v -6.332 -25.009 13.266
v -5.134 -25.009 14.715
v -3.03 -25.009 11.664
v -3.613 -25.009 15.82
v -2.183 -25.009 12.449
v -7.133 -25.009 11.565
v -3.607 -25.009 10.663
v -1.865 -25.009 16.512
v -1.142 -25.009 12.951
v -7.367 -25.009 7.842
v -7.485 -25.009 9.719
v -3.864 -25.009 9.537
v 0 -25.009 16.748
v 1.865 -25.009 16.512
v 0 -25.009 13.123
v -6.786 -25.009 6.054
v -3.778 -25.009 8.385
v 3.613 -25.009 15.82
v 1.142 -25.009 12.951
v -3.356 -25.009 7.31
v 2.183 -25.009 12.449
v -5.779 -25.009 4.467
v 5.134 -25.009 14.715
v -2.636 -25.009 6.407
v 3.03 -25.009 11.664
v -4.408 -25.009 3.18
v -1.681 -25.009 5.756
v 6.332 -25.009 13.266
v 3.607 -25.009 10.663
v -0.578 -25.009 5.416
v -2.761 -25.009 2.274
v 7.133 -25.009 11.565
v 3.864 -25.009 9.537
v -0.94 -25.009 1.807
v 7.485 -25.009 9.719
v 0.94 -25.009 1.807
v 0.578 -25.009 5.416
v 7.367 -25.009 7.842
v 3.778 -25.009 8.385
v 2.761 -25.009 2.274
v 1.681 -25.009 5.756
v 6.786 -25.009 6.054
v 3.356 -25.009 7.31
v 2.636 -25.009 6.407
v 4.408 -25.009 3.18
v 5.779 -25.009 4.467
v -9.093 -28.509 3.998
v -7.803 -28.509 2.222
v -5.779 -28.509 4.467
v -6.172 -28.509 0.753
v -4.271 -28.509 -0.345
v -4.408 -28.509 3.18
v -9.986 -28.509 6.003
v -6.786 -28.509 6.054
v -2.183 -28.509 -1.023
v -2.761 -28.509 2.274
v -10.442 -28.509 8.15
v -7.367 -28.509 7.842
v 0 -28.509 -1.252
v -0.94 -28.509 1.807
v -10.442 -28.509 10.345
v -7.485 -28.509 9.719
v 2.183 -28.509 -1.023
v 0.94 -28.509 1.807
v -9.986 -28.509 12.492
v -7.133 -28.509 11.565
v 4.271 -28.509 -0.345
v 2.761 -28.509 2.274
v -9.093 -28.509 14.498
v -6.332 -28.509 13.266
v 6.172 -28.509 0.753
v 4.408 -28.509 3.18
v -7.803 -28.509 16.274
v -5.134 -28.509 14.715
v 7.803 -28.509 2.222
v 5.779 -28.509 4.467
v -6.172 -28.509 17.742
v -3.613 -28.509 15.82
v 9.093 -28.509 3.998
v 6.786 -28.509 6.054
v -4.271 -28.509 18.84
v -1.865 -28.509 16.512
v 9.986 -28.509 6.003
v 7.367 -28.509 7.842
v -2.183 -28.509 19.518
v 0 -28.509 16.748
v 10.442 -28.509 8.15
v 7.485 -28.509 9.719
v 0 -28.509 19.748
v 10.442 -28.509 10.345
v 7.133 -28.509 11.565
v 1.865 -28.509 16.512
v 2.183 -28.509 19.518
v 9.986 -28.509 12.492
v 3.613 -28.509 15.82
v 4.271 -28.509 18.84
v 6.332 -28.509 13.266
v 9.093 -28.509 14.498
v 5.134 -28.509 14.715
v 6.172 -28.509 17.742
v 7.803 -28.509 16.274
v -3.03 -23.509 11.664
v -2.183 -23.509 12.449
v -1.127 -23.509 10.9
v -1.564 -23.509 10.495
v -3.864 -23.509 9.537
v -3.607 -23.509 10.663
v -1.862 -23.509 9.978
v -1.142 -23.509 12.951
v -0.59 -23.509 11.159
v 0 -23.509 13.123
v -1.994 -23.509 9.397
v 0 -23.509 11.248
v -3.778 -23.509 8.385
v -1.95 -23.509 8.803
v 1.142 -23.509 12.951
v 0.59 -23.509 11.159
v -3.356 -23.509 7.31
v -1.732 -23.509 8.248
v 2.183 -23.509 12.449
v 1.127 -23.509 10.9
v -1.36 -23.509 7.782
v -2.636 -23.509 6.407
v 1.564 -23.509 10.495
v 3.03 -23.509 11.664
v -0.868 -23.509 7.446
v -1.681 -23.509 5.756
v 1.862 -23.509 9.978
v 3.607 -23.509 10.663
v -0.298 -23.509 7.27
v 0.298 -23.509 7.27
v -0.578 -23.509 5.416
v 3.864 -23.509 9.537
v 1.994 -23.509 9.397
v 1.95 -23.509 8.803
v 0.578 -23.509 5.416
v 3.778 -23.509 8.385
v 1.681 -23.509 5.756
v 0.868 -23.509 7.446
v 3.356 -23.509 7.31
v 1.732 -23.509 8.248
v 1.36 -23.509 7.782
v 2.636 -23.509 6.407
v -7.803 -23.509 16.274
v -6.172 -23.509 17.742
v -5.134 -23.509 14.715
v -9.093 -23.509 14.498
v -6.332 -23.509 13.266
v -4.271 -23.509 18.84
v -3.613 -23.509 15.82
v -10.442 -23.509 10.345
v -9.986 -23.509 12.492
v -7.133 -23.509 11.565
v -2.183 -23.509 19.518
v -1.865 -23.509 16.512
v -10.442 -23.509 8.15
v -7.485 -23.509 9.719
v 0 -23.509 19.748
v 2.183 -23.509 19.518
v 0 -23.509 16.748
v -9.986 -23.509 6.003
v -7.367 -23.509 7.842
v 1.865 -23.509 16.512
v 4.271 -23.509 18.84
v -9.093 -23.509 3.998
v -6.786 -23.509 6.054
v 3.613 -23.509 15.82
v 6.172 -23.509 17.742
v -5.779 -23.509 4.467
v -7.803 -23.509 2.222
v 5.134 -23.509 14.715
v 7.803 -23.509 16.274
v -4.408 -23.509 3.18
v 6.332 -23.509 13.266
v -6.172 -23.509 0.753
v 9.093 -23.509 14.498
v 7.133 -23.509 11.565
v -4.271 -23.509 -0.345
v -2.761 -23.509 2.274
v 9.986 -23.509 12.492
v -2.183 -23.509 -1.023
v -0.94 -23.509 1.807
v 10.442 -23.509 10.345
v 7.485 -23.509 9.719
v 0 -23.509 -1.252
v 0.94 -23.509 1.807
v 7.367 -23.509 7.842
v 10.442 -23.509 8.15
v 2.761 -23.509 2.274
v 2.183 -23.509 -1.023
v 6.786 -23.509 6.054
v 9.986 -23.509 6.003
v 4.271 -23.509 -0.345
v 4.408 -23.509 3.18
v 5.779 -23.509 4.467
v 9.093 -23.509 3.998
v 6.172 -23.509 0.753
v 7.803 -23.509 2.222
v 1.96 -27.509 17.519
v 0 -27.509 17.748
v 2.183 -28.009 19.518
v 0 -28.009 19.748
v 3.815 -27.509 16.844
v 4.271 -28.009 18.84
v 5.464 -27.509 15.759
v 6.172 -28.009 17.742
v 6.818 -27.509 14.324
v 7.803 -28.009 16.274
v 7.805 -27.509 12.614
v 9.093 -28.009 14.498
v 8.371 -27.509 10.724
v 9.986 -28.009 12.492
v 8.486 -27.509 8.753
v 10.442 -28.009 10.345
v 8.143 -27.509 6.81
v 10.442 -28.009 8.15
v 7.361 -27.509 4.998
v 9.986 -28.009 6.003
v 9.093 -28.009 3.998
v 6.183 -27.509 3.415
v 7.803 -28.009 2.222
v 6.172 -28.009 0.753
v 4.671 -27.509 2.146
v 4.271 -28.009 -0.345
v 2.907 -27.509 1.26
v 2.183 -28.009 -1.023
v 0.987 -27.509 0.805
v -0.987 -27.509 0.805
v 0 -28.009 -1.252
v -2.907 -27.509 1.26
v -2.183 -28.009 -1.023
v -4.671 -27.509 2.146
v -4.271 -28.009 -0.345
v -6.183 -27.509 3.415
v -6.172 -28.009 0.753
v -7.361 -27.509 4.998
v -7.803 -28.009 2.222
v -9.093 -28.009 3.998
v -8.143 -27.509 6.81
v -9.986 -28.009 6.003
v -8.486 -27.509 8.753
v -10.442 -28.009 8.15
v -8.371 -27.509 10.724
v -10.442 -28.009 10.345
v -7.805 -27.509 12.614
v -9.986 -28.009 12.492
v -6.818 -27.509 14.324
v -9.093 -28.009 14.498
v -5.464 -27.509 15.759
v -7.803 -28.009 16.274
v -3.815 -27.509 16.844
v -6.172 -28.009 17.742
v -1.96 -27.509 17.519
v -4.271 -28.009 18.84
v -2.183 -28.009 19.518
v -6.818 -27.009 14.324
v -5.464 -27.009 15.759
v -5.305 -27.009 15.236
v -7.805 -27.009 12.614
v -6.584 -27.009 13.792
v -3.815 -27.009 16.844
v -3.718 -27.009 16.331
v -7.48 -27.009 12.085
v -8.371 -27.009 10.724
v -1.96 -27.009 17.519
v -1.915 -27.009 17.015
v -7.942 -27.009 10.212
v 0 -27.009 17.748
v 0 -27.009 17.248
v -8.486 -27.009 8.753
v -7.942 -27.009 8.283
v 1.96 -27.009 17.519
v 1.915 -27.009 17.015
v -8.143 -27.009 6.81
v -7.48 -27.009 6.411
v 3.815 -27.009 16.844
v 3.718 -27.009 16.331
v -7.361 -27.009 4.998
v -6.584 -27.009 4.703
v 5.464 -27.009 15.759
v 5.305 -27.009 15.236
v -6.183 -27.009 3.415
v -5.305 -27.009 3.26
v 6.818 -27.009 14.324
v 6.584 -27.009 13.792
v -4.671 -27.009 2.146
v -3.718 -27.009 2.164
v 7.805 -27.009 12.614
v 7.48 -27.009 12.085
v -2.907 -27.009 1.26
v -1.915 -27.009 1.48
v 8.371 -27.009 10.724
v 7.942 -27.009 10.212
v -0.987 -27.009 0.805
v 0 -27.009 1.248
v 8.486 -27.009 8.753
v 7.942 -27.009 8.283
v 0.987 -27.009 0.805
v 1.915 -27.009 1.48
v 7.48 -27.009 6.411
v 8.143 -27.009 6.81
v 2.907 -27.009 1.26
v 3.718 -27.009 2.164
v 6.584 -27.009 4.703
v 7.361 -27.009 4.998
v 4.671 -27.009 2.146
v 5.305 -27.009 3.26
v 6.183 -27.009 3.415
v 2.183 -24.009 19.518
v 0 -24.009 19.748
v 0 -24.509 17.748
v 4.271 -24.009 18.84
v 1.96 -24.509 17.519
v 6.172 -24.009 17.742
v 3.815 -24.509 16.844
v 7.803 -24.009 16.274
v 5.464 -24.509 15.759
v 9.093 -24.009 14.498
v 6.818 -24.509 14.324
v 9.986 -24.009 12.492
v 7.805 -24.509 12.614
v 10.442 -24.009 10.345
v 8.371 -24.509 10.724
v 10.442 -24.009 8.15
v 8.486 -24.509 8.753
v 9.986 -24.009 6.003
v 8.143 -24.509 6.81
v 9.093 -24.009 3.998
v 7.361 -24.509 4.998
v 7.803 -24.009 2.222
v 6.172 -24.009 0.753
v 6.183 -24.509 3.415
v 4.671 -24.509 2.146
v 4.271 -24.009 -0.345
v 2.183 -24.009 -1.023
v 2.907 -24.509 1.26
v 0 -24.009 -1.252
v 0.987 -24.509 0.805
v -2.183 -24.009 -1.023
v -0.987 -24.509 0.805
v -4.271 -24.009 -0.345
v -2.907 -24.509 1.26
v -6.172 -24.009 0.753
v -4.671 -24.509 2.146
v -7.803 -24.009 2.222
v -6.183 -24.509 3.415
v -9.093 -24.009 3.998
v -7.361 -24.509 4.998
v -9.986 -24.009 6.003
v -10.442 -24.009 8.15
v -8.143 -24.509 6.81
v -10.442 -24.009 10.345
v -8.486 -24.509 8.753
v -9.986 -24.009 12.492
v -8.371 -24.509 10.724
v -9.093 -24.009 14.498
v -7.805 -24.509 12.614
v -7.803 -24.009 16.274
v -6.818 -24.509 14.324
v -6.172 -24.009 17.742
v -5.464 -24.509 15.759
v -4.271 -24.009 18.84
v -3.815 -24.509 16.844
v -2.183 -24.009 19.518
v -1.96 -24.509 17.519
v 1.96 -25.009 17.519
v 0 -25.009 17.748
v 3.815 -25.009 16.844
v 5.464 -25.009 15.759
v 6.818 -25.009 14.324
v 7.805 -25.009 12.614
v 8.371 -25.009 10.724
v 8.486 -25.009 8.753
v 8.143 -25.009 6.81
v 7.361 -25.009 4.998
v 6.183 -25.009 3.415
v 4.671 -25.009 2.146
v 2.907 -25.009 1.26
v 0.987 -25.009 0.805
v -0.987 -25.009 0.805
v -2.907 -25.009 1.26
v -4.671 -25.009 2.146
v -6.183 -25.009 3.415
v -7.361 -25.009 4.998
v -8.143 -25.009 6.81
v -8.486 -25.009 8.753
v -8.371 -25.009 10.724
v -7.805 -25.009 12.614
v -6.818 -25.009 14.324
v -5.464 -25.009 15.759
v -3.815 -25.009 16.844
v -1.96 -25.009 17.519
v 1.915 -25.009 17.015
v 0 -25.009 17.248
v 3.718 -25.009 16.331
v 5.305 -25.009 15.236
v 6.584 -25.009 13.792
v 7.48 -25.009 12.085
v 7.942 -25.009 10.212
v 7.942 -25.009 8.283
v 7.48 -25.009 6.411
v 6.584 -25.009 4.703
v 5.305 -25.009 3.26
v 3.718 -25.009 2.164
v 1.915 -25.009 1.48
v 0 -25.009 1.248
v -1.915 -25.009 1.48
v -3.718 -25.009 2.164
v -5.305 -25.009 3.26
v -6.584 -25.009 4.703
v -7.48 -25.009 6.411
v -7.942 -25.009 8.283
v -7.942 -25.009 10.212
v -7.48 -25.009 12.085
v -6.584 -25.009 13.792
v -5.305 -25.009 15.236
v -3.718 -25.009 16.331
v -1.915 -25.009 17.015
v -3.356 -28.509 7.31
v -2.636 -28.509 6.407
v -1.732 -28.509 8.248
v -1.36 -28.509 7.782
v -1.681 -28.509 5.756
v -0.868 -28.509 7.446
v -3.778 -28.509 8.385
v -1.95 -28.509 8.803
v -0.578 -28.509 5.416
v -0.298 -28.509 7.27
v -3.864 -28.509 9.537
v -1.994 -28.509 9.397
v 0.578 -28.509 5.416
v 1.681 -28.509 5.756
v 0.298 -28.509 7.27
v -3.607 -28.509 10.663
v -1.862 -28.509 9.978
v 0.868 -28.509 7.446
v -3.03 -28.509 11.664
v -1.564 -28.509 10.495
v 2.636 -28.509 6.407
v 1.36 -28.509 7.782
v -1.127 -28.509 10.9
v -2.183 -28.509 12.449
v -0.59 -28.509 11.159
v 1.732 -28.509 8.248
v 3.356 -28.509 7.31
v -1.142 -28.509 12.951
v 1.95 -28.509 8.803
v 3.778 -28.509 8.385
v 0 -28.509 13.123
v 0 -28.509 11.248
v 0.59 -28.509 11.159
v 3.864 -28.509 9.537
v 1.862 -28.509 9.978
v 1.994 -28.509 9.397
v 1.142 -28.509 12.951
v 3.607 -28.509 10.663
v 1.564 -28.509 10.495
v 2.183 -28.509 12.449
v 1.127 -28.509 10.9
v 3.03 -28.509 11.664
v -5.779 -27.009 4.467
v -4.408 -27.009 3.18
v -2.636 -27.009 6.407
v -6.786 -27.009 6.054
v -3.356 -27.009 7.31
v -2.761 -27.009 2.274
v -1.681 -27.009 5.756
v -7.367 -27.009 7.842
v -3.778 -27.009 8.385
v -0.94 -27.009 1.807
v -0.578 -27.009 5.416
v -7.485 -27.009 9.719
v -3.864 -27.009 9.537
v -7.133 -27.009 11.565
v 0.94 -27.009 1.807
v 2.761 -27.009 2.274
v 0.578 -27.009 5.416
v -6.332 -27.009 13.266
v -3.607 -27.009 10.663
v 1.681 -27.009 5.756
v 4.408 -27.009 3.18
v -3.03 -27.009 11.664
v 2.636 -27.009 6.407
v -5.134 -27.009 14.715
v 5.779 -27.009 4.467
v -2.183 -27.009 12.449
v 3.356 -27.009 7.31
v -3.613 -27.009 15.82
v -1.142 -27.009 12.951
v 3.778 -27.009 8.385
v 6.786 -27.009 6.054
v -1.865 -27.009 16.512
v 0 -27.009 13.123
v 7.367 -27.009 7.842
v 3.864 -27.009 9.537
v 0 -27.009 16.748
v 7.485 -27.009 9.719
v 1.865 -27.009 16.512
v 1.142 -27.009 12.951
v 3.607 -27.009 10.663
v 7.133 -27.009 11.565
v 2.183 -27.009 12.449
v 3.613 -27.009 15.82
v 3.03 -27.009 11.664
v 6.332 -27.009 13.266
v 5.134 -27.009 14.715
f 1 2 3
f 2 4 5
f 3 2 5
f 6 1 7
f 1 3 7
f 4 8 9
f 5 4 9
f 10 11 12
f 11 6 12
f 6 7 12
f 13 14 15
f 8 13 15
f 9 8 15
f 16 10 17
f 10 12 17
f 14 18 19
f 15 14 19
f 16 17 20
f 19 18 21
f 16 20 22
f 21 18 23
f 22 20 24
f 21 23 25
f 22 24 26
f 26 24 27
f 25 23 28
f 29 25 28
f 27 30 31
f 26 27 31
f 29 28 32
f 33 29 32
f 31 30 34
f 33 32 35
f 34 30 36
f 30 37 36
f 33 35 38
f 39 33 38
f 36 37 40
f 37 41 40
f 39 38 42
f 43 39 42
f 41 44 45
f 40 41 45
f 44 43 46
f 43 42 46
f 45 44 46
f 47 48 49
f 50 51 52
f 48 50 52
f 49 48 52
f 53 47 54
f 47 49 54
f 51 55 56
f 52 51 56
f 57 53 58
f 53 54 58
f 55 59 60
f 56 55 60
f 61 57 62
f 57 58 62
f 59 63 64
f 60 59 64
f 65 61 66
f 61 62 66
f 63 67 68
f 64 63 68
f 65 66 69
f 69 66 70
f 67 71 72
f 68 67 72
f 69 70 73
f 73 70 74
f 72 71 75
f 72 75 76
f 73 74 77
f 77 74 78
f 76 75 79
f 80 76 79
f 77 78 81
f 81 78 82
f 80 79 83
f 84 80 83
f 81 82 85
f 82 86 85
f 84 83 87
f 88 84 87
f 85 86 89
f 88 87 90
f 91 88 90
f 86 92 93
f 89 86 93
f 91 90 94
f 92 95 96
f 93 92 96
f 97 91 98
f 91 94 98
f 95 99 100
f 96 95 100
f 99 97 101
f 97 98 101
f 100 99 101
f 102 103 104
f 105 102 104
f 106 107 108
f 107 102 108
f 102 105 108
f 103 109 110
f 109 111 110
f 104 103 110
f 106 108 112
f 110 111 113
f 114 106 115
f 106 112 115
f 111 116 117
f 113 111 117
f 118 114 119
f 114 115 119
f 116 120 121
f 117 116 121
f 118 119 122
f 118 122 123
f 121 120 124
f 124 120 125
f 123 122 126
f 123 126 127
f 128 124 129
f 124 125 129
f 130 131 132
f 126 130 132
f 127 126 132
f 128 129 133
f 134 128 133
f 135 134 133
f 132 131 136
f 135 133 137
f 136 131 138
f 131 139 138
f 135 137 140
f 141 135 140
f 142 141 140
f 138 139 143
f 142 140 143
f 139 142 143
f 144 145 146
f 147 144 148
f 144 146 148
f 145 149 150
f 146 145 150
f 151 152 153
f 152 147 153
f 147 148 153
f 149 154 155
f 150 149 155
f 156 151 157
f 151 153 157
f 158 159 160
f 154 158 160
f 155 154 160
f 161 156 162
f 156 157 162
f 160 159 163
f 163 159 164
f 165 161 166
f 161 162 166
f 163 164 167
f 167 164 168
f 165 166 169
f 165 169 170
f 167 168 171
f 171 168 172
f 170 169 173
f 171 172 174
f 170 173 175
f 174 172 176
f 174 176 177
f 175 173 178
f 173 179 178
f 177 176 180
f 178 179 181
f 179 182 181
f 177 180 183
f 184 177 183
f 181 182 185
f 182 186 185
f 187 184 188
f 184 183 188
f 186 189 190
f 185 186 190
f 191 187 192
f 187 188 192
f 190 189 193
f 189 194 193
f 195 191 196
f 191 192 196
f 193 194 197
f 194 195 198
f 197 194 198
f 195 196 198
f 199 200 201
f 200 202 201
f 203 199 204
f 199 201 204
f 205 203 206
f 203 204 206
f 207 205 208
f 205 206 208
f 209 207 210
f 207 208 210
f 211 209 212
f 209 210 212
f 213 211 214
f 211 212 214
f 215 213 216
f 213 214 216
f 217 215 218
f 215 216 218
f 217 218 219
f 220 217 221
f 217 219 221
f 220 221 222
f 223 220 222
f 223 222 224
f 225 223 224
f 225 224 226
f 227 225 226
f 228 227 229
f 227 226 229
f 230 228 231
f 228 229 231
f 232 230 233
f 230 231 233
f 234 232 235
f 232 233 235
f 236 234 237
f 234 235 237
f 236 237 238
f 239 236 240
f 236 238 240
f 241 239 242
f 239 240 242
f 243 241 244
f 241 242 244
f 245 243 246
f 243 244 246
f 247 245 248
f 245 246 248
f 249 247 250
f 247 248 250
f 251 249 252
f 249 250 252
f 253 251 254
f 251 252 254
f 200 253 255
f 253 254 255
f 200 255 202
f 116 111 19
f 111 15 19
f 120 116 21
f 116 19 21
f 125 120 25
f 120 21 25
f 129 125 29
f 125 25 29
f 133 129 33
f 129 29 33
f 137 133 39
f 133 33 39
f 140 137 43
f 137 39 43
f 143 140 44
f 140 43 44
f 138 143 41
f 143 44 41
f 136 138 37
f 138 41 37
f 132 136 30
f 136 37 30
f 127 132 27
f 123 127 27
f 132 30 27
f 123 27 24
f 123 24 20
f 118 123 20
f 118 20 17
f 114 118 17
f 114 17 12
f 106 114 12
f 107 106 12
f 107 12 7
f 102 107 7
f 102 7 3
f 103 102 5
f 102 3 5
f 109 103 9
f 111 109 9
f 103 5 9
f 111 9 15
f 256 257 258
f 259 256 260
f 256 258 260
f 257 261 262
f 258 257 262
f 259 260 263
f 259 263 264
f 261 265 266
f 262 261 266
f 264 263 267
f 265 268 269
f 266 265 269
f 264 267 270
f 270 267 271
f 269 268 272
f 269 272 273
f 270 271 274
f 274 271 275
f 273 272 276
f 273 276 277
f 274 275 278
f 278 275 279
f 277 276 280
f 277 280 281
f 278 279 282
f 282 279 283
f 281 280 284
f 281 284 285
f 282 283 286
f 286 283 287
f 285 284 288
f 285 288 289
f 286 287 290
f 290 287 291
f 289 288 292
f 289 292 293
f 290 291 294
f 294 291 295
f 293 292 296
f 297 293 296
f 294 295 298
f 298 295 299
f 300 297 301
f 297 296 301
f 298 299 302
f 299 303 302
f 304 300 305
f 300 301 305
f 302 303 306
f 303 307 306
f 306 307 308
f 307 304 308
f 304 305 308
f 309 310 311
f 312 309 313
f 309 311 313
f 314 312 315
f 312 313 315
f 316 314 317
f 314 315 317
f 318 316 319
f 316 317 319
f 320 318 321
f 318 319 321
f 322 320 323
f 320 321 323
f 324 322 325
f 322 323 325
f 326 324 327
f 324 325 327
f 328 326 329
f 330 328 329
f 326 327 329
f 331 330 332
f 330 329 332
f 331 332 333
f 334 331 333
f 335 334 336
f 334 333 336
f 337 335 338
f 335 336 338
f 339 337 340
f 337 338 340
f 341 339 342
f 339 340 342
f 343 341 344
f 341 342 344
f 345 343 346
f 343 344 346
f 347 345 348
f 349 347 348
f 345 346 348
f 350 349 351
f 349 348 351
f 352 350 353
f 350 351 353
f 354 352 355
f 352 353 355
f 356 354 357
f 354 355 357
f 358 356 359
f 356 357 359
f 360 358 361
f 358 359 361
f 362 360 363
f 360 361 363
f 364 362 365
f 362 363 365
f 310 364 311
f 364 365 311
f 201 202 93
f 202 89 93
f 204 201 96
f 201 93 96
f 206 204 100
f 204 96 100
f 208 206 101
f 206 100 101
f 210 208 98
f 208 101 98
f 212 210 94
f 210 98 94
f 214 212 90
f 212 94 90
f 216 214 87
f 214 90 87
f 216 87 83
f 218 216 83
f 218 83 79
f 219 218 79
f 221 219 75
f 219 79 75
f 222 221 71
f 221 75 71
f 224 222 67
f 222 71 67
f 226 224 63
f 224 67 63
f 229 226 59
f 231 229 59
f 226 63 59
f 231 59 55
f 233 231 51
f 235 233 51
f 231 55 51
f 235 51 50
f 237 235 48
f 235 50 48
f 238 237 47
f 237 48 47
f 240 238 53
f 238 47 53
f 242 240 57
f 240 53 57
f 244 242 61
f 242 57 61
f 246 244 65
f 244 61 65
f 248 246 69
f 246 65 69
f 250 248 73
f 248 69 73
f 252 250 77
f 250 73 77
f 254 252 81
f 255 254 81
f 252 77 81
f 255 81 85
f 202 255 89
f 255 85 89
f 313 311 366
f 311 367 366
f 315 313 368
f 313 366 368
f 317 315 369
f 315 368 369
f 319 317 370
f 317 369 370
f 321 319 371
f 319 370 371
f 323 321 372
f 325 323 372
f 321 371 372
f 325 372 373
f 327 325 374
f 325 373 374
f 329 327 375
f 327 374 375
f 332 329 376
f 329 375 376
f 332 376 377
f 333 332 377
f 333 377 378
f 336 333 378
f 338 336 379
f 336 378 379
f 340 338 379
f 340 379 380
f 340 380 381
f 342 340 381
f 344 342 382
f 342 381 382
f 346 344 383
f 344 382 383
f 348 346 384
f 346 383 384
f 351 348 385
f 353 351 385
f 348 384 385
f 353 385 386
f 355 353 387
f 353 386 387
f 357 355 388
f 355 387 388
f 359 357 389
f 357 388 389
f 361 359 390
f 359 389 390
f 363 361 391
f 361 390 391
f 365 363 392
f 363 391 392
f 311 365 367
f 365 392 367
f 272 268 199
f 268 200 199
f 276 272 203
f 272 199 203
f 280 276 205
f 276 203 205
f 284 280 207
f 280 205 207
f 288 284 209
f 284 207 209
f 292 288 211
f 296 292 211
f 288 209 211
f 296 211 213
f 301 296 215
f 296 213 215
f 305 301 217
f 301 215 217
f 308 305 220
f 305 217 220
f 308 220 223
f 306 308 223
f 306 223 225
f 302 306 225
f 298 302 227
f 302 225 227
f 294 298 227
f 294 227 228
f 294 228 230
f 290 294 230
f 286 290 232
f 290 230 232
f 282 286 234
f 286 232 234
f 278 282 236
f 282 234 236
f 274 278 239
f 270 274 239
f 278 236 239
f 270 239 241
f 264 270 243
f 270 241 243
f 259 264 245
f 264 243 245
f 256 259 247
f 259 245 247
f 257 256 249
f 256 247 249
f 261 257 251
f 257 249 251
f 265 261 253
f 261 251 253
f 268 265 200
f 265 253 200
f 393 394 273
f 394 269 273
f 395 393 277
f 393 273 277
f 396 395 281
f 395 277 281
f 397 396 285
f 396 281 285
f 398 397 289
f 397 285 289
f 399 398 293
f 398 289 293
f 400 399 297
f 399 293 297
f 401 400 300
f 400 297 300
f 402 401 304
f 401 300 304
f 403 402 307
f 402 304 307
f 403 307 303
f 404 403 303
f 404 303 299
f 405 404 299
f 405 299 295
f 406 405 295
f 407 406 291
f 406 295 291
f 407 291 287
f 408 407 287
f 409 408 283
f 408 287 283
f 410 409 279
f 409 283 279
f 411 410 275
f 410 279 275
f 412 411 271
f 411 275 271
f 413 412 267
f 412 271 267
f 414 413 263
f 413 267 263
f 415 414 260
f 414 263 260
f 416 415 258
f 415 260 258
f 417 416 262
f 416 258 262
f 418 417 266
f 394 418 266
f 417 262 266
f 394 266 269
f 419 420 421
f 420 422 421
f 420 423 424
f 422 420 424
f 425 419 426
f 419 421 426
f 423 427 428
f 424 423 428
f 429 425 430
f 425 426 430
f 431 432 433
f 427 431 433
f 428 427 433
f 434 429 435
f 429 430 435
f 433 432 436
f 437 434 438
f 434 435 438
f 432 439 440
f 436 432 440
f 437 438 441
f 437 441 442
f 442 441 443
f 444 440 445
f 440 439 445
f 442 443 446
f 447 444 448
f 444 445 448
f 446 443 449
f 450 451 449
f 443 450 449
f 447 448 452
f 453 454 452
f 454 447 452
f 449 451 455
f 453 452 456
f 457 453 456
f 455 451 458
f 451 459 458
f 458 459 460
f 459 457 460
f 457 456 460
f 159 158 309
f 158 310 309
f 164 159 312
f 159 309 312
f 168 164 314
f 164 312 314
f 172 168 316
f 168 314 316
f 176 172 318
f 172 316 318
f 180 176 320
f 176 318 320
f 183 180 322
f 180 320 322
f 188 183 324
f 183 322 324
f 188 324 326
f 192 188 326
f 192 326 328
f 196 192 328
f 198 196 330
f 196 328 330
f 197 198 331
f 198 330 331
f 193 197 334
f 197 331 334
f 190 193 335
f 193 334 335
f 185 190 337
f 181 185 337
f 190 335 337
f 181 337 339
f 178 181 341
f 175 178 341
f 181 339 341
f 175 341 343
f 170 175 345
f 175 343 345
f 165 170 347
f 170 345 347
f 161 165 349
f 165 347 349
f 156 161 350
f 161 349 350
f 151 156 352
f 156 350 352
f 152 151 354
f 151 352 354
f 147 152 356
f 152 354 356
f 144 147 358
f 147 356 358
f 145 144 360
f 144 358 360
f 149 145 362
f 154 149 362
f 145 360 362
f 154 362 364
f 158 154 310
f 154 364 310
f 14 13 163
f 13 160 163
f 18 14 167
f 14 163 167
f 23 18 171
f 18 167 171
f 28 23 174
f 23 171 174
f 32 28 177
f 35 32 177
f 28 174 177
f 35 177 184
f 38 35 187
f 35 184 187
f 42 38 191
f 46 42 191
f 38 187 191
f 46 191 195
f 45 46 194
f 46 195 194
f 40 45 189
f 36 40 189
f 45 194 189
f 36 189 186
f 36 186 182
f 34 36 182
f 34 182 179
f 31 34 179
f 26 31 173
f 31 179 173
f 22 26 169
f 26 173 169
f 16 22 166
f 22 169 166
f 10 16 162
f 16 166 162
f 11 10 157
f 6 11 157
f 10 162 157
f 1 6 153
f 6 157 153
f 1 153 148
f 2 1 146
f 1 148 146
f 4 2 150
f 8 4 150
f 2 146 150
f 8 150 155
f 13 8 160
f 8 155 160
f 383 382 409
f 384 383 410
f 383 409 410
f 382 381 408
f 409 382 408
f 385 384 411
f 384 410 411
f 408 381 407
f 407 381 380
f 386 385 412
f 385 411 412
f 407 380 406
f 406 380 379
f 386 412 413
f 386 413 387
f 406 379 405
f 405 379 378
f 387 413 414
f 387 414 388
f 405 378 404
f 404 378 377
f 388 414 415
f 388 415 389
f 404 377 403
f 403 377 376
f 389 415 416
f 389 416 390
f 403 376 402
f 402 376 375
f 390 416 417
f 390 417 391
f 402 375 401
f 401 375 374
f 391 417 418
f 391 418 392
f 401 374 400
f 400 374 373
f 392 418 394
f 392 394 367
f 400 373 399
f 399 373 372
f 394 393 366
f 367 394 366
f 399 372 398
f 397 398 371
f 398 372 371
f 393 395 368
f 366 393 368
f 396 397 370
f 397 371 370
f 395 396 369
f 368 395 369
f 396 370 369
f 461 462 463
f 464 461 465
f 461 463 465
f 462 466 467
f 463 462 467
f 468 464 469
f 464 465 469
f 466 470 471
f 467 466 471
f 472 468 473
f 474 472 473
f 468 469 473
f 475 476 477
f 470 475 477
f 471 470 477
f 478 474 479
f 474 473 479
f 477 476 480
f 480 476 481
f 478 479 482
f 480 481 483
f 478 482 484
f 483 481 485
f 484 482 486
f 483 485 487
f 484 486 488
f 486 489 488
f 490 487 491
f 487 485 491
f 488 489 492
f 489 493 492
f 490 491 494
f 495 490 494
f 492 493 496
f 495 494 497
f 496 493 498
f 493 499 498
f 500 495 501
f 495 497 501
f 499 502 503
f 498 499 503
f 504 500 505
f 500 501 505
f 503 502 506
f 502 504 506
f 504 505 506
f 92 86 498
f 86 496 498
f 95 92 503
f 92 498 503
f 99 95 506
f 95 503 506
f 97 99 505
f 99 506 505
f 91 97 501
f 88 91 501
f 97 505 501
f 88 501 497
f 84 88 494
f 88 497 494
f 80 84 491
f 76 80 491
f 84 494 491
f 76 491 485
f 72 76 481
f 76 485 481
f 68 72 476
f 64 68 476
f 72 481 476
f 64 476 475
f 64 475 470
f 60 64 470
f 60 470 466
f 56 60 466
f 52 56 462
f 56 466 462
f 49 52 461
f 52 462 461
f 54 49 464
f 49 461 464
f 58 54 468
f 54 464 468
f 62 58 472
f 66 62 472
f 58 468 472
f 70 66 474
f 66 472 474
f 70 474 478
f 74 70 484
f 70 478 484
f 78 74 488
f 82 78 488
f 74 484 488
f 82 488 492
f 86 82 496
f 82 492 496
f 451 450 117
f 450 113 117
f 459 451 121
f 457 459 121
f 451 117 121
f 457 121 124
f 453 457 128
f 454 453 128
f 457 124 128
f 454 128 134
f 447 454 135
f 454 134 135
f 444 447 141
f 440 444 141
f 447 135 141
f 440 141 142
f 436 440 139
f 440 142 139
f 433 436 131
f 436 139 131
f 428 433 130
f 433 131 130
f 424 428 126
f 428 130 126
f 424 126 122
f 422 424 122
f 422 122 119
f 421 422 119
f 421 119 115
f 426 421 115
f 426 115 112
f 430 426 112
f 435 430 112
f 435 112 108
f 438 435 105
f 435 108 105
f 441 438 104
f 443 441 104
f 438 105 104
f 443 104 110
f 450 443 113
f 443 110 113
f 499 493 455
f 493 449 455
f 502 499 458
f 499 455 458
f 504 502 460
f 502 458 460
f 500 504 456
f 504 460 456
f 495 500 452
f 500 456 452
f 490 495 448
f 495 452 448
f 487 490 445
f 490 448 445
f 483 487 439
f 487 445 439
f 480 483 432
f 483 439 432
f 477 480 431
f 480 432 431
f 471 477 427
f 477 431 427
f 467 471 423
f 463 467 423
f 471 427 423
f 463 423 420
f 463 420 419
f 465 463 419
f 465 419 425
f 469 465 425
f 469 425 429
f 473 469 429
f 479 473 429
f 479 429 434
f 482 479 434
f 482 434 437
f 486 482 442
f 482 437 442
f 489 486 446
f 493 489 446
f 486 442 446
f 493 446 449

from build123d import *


# Not quite as in the source:
# - a feature names something its author has since deleted; it is built from what else it names


with BuildPart() as f1:
    # F0 (on Right) → F1 (revolve)
    with BuildSketch(Plane.YZ):
        Polygon((-23.5091740638, 16.747707203), (-23.5091740638, 19.747707203), (-24.0091740638, 19.747707203), (-24.5091740638, 17.747707203), (-25.0091740638, 17.747707203), (-25.0091740638, 17.247707203), (-27.0091740638, 17.247707203), (-27.0091740638, 17.747707203), (-27.5091740638, 17.747707203), (-28.0091740638, 19.747707203), (-28.5091740638, 19.747707203), (-28.5091740638, 16.747707203), (-27.0091740638, 16.747707203), (-27.0091740638, 13.122707203), (-28.5091740638, 13.122707203), (-28.5091740638, 11.247707203), (-26.0091740638, 11.247707203), (-23.5091740638, 11.247707203), (-23.5091740638, 13.122707203), (-25.0091740638, 13.122707203), (-25.0091740638, 16.747707203), align=None)
    revolve(axis=Axis((0, -33.8120413944, 9.247707203), (0, 1, 0)))


solid = f1.part
